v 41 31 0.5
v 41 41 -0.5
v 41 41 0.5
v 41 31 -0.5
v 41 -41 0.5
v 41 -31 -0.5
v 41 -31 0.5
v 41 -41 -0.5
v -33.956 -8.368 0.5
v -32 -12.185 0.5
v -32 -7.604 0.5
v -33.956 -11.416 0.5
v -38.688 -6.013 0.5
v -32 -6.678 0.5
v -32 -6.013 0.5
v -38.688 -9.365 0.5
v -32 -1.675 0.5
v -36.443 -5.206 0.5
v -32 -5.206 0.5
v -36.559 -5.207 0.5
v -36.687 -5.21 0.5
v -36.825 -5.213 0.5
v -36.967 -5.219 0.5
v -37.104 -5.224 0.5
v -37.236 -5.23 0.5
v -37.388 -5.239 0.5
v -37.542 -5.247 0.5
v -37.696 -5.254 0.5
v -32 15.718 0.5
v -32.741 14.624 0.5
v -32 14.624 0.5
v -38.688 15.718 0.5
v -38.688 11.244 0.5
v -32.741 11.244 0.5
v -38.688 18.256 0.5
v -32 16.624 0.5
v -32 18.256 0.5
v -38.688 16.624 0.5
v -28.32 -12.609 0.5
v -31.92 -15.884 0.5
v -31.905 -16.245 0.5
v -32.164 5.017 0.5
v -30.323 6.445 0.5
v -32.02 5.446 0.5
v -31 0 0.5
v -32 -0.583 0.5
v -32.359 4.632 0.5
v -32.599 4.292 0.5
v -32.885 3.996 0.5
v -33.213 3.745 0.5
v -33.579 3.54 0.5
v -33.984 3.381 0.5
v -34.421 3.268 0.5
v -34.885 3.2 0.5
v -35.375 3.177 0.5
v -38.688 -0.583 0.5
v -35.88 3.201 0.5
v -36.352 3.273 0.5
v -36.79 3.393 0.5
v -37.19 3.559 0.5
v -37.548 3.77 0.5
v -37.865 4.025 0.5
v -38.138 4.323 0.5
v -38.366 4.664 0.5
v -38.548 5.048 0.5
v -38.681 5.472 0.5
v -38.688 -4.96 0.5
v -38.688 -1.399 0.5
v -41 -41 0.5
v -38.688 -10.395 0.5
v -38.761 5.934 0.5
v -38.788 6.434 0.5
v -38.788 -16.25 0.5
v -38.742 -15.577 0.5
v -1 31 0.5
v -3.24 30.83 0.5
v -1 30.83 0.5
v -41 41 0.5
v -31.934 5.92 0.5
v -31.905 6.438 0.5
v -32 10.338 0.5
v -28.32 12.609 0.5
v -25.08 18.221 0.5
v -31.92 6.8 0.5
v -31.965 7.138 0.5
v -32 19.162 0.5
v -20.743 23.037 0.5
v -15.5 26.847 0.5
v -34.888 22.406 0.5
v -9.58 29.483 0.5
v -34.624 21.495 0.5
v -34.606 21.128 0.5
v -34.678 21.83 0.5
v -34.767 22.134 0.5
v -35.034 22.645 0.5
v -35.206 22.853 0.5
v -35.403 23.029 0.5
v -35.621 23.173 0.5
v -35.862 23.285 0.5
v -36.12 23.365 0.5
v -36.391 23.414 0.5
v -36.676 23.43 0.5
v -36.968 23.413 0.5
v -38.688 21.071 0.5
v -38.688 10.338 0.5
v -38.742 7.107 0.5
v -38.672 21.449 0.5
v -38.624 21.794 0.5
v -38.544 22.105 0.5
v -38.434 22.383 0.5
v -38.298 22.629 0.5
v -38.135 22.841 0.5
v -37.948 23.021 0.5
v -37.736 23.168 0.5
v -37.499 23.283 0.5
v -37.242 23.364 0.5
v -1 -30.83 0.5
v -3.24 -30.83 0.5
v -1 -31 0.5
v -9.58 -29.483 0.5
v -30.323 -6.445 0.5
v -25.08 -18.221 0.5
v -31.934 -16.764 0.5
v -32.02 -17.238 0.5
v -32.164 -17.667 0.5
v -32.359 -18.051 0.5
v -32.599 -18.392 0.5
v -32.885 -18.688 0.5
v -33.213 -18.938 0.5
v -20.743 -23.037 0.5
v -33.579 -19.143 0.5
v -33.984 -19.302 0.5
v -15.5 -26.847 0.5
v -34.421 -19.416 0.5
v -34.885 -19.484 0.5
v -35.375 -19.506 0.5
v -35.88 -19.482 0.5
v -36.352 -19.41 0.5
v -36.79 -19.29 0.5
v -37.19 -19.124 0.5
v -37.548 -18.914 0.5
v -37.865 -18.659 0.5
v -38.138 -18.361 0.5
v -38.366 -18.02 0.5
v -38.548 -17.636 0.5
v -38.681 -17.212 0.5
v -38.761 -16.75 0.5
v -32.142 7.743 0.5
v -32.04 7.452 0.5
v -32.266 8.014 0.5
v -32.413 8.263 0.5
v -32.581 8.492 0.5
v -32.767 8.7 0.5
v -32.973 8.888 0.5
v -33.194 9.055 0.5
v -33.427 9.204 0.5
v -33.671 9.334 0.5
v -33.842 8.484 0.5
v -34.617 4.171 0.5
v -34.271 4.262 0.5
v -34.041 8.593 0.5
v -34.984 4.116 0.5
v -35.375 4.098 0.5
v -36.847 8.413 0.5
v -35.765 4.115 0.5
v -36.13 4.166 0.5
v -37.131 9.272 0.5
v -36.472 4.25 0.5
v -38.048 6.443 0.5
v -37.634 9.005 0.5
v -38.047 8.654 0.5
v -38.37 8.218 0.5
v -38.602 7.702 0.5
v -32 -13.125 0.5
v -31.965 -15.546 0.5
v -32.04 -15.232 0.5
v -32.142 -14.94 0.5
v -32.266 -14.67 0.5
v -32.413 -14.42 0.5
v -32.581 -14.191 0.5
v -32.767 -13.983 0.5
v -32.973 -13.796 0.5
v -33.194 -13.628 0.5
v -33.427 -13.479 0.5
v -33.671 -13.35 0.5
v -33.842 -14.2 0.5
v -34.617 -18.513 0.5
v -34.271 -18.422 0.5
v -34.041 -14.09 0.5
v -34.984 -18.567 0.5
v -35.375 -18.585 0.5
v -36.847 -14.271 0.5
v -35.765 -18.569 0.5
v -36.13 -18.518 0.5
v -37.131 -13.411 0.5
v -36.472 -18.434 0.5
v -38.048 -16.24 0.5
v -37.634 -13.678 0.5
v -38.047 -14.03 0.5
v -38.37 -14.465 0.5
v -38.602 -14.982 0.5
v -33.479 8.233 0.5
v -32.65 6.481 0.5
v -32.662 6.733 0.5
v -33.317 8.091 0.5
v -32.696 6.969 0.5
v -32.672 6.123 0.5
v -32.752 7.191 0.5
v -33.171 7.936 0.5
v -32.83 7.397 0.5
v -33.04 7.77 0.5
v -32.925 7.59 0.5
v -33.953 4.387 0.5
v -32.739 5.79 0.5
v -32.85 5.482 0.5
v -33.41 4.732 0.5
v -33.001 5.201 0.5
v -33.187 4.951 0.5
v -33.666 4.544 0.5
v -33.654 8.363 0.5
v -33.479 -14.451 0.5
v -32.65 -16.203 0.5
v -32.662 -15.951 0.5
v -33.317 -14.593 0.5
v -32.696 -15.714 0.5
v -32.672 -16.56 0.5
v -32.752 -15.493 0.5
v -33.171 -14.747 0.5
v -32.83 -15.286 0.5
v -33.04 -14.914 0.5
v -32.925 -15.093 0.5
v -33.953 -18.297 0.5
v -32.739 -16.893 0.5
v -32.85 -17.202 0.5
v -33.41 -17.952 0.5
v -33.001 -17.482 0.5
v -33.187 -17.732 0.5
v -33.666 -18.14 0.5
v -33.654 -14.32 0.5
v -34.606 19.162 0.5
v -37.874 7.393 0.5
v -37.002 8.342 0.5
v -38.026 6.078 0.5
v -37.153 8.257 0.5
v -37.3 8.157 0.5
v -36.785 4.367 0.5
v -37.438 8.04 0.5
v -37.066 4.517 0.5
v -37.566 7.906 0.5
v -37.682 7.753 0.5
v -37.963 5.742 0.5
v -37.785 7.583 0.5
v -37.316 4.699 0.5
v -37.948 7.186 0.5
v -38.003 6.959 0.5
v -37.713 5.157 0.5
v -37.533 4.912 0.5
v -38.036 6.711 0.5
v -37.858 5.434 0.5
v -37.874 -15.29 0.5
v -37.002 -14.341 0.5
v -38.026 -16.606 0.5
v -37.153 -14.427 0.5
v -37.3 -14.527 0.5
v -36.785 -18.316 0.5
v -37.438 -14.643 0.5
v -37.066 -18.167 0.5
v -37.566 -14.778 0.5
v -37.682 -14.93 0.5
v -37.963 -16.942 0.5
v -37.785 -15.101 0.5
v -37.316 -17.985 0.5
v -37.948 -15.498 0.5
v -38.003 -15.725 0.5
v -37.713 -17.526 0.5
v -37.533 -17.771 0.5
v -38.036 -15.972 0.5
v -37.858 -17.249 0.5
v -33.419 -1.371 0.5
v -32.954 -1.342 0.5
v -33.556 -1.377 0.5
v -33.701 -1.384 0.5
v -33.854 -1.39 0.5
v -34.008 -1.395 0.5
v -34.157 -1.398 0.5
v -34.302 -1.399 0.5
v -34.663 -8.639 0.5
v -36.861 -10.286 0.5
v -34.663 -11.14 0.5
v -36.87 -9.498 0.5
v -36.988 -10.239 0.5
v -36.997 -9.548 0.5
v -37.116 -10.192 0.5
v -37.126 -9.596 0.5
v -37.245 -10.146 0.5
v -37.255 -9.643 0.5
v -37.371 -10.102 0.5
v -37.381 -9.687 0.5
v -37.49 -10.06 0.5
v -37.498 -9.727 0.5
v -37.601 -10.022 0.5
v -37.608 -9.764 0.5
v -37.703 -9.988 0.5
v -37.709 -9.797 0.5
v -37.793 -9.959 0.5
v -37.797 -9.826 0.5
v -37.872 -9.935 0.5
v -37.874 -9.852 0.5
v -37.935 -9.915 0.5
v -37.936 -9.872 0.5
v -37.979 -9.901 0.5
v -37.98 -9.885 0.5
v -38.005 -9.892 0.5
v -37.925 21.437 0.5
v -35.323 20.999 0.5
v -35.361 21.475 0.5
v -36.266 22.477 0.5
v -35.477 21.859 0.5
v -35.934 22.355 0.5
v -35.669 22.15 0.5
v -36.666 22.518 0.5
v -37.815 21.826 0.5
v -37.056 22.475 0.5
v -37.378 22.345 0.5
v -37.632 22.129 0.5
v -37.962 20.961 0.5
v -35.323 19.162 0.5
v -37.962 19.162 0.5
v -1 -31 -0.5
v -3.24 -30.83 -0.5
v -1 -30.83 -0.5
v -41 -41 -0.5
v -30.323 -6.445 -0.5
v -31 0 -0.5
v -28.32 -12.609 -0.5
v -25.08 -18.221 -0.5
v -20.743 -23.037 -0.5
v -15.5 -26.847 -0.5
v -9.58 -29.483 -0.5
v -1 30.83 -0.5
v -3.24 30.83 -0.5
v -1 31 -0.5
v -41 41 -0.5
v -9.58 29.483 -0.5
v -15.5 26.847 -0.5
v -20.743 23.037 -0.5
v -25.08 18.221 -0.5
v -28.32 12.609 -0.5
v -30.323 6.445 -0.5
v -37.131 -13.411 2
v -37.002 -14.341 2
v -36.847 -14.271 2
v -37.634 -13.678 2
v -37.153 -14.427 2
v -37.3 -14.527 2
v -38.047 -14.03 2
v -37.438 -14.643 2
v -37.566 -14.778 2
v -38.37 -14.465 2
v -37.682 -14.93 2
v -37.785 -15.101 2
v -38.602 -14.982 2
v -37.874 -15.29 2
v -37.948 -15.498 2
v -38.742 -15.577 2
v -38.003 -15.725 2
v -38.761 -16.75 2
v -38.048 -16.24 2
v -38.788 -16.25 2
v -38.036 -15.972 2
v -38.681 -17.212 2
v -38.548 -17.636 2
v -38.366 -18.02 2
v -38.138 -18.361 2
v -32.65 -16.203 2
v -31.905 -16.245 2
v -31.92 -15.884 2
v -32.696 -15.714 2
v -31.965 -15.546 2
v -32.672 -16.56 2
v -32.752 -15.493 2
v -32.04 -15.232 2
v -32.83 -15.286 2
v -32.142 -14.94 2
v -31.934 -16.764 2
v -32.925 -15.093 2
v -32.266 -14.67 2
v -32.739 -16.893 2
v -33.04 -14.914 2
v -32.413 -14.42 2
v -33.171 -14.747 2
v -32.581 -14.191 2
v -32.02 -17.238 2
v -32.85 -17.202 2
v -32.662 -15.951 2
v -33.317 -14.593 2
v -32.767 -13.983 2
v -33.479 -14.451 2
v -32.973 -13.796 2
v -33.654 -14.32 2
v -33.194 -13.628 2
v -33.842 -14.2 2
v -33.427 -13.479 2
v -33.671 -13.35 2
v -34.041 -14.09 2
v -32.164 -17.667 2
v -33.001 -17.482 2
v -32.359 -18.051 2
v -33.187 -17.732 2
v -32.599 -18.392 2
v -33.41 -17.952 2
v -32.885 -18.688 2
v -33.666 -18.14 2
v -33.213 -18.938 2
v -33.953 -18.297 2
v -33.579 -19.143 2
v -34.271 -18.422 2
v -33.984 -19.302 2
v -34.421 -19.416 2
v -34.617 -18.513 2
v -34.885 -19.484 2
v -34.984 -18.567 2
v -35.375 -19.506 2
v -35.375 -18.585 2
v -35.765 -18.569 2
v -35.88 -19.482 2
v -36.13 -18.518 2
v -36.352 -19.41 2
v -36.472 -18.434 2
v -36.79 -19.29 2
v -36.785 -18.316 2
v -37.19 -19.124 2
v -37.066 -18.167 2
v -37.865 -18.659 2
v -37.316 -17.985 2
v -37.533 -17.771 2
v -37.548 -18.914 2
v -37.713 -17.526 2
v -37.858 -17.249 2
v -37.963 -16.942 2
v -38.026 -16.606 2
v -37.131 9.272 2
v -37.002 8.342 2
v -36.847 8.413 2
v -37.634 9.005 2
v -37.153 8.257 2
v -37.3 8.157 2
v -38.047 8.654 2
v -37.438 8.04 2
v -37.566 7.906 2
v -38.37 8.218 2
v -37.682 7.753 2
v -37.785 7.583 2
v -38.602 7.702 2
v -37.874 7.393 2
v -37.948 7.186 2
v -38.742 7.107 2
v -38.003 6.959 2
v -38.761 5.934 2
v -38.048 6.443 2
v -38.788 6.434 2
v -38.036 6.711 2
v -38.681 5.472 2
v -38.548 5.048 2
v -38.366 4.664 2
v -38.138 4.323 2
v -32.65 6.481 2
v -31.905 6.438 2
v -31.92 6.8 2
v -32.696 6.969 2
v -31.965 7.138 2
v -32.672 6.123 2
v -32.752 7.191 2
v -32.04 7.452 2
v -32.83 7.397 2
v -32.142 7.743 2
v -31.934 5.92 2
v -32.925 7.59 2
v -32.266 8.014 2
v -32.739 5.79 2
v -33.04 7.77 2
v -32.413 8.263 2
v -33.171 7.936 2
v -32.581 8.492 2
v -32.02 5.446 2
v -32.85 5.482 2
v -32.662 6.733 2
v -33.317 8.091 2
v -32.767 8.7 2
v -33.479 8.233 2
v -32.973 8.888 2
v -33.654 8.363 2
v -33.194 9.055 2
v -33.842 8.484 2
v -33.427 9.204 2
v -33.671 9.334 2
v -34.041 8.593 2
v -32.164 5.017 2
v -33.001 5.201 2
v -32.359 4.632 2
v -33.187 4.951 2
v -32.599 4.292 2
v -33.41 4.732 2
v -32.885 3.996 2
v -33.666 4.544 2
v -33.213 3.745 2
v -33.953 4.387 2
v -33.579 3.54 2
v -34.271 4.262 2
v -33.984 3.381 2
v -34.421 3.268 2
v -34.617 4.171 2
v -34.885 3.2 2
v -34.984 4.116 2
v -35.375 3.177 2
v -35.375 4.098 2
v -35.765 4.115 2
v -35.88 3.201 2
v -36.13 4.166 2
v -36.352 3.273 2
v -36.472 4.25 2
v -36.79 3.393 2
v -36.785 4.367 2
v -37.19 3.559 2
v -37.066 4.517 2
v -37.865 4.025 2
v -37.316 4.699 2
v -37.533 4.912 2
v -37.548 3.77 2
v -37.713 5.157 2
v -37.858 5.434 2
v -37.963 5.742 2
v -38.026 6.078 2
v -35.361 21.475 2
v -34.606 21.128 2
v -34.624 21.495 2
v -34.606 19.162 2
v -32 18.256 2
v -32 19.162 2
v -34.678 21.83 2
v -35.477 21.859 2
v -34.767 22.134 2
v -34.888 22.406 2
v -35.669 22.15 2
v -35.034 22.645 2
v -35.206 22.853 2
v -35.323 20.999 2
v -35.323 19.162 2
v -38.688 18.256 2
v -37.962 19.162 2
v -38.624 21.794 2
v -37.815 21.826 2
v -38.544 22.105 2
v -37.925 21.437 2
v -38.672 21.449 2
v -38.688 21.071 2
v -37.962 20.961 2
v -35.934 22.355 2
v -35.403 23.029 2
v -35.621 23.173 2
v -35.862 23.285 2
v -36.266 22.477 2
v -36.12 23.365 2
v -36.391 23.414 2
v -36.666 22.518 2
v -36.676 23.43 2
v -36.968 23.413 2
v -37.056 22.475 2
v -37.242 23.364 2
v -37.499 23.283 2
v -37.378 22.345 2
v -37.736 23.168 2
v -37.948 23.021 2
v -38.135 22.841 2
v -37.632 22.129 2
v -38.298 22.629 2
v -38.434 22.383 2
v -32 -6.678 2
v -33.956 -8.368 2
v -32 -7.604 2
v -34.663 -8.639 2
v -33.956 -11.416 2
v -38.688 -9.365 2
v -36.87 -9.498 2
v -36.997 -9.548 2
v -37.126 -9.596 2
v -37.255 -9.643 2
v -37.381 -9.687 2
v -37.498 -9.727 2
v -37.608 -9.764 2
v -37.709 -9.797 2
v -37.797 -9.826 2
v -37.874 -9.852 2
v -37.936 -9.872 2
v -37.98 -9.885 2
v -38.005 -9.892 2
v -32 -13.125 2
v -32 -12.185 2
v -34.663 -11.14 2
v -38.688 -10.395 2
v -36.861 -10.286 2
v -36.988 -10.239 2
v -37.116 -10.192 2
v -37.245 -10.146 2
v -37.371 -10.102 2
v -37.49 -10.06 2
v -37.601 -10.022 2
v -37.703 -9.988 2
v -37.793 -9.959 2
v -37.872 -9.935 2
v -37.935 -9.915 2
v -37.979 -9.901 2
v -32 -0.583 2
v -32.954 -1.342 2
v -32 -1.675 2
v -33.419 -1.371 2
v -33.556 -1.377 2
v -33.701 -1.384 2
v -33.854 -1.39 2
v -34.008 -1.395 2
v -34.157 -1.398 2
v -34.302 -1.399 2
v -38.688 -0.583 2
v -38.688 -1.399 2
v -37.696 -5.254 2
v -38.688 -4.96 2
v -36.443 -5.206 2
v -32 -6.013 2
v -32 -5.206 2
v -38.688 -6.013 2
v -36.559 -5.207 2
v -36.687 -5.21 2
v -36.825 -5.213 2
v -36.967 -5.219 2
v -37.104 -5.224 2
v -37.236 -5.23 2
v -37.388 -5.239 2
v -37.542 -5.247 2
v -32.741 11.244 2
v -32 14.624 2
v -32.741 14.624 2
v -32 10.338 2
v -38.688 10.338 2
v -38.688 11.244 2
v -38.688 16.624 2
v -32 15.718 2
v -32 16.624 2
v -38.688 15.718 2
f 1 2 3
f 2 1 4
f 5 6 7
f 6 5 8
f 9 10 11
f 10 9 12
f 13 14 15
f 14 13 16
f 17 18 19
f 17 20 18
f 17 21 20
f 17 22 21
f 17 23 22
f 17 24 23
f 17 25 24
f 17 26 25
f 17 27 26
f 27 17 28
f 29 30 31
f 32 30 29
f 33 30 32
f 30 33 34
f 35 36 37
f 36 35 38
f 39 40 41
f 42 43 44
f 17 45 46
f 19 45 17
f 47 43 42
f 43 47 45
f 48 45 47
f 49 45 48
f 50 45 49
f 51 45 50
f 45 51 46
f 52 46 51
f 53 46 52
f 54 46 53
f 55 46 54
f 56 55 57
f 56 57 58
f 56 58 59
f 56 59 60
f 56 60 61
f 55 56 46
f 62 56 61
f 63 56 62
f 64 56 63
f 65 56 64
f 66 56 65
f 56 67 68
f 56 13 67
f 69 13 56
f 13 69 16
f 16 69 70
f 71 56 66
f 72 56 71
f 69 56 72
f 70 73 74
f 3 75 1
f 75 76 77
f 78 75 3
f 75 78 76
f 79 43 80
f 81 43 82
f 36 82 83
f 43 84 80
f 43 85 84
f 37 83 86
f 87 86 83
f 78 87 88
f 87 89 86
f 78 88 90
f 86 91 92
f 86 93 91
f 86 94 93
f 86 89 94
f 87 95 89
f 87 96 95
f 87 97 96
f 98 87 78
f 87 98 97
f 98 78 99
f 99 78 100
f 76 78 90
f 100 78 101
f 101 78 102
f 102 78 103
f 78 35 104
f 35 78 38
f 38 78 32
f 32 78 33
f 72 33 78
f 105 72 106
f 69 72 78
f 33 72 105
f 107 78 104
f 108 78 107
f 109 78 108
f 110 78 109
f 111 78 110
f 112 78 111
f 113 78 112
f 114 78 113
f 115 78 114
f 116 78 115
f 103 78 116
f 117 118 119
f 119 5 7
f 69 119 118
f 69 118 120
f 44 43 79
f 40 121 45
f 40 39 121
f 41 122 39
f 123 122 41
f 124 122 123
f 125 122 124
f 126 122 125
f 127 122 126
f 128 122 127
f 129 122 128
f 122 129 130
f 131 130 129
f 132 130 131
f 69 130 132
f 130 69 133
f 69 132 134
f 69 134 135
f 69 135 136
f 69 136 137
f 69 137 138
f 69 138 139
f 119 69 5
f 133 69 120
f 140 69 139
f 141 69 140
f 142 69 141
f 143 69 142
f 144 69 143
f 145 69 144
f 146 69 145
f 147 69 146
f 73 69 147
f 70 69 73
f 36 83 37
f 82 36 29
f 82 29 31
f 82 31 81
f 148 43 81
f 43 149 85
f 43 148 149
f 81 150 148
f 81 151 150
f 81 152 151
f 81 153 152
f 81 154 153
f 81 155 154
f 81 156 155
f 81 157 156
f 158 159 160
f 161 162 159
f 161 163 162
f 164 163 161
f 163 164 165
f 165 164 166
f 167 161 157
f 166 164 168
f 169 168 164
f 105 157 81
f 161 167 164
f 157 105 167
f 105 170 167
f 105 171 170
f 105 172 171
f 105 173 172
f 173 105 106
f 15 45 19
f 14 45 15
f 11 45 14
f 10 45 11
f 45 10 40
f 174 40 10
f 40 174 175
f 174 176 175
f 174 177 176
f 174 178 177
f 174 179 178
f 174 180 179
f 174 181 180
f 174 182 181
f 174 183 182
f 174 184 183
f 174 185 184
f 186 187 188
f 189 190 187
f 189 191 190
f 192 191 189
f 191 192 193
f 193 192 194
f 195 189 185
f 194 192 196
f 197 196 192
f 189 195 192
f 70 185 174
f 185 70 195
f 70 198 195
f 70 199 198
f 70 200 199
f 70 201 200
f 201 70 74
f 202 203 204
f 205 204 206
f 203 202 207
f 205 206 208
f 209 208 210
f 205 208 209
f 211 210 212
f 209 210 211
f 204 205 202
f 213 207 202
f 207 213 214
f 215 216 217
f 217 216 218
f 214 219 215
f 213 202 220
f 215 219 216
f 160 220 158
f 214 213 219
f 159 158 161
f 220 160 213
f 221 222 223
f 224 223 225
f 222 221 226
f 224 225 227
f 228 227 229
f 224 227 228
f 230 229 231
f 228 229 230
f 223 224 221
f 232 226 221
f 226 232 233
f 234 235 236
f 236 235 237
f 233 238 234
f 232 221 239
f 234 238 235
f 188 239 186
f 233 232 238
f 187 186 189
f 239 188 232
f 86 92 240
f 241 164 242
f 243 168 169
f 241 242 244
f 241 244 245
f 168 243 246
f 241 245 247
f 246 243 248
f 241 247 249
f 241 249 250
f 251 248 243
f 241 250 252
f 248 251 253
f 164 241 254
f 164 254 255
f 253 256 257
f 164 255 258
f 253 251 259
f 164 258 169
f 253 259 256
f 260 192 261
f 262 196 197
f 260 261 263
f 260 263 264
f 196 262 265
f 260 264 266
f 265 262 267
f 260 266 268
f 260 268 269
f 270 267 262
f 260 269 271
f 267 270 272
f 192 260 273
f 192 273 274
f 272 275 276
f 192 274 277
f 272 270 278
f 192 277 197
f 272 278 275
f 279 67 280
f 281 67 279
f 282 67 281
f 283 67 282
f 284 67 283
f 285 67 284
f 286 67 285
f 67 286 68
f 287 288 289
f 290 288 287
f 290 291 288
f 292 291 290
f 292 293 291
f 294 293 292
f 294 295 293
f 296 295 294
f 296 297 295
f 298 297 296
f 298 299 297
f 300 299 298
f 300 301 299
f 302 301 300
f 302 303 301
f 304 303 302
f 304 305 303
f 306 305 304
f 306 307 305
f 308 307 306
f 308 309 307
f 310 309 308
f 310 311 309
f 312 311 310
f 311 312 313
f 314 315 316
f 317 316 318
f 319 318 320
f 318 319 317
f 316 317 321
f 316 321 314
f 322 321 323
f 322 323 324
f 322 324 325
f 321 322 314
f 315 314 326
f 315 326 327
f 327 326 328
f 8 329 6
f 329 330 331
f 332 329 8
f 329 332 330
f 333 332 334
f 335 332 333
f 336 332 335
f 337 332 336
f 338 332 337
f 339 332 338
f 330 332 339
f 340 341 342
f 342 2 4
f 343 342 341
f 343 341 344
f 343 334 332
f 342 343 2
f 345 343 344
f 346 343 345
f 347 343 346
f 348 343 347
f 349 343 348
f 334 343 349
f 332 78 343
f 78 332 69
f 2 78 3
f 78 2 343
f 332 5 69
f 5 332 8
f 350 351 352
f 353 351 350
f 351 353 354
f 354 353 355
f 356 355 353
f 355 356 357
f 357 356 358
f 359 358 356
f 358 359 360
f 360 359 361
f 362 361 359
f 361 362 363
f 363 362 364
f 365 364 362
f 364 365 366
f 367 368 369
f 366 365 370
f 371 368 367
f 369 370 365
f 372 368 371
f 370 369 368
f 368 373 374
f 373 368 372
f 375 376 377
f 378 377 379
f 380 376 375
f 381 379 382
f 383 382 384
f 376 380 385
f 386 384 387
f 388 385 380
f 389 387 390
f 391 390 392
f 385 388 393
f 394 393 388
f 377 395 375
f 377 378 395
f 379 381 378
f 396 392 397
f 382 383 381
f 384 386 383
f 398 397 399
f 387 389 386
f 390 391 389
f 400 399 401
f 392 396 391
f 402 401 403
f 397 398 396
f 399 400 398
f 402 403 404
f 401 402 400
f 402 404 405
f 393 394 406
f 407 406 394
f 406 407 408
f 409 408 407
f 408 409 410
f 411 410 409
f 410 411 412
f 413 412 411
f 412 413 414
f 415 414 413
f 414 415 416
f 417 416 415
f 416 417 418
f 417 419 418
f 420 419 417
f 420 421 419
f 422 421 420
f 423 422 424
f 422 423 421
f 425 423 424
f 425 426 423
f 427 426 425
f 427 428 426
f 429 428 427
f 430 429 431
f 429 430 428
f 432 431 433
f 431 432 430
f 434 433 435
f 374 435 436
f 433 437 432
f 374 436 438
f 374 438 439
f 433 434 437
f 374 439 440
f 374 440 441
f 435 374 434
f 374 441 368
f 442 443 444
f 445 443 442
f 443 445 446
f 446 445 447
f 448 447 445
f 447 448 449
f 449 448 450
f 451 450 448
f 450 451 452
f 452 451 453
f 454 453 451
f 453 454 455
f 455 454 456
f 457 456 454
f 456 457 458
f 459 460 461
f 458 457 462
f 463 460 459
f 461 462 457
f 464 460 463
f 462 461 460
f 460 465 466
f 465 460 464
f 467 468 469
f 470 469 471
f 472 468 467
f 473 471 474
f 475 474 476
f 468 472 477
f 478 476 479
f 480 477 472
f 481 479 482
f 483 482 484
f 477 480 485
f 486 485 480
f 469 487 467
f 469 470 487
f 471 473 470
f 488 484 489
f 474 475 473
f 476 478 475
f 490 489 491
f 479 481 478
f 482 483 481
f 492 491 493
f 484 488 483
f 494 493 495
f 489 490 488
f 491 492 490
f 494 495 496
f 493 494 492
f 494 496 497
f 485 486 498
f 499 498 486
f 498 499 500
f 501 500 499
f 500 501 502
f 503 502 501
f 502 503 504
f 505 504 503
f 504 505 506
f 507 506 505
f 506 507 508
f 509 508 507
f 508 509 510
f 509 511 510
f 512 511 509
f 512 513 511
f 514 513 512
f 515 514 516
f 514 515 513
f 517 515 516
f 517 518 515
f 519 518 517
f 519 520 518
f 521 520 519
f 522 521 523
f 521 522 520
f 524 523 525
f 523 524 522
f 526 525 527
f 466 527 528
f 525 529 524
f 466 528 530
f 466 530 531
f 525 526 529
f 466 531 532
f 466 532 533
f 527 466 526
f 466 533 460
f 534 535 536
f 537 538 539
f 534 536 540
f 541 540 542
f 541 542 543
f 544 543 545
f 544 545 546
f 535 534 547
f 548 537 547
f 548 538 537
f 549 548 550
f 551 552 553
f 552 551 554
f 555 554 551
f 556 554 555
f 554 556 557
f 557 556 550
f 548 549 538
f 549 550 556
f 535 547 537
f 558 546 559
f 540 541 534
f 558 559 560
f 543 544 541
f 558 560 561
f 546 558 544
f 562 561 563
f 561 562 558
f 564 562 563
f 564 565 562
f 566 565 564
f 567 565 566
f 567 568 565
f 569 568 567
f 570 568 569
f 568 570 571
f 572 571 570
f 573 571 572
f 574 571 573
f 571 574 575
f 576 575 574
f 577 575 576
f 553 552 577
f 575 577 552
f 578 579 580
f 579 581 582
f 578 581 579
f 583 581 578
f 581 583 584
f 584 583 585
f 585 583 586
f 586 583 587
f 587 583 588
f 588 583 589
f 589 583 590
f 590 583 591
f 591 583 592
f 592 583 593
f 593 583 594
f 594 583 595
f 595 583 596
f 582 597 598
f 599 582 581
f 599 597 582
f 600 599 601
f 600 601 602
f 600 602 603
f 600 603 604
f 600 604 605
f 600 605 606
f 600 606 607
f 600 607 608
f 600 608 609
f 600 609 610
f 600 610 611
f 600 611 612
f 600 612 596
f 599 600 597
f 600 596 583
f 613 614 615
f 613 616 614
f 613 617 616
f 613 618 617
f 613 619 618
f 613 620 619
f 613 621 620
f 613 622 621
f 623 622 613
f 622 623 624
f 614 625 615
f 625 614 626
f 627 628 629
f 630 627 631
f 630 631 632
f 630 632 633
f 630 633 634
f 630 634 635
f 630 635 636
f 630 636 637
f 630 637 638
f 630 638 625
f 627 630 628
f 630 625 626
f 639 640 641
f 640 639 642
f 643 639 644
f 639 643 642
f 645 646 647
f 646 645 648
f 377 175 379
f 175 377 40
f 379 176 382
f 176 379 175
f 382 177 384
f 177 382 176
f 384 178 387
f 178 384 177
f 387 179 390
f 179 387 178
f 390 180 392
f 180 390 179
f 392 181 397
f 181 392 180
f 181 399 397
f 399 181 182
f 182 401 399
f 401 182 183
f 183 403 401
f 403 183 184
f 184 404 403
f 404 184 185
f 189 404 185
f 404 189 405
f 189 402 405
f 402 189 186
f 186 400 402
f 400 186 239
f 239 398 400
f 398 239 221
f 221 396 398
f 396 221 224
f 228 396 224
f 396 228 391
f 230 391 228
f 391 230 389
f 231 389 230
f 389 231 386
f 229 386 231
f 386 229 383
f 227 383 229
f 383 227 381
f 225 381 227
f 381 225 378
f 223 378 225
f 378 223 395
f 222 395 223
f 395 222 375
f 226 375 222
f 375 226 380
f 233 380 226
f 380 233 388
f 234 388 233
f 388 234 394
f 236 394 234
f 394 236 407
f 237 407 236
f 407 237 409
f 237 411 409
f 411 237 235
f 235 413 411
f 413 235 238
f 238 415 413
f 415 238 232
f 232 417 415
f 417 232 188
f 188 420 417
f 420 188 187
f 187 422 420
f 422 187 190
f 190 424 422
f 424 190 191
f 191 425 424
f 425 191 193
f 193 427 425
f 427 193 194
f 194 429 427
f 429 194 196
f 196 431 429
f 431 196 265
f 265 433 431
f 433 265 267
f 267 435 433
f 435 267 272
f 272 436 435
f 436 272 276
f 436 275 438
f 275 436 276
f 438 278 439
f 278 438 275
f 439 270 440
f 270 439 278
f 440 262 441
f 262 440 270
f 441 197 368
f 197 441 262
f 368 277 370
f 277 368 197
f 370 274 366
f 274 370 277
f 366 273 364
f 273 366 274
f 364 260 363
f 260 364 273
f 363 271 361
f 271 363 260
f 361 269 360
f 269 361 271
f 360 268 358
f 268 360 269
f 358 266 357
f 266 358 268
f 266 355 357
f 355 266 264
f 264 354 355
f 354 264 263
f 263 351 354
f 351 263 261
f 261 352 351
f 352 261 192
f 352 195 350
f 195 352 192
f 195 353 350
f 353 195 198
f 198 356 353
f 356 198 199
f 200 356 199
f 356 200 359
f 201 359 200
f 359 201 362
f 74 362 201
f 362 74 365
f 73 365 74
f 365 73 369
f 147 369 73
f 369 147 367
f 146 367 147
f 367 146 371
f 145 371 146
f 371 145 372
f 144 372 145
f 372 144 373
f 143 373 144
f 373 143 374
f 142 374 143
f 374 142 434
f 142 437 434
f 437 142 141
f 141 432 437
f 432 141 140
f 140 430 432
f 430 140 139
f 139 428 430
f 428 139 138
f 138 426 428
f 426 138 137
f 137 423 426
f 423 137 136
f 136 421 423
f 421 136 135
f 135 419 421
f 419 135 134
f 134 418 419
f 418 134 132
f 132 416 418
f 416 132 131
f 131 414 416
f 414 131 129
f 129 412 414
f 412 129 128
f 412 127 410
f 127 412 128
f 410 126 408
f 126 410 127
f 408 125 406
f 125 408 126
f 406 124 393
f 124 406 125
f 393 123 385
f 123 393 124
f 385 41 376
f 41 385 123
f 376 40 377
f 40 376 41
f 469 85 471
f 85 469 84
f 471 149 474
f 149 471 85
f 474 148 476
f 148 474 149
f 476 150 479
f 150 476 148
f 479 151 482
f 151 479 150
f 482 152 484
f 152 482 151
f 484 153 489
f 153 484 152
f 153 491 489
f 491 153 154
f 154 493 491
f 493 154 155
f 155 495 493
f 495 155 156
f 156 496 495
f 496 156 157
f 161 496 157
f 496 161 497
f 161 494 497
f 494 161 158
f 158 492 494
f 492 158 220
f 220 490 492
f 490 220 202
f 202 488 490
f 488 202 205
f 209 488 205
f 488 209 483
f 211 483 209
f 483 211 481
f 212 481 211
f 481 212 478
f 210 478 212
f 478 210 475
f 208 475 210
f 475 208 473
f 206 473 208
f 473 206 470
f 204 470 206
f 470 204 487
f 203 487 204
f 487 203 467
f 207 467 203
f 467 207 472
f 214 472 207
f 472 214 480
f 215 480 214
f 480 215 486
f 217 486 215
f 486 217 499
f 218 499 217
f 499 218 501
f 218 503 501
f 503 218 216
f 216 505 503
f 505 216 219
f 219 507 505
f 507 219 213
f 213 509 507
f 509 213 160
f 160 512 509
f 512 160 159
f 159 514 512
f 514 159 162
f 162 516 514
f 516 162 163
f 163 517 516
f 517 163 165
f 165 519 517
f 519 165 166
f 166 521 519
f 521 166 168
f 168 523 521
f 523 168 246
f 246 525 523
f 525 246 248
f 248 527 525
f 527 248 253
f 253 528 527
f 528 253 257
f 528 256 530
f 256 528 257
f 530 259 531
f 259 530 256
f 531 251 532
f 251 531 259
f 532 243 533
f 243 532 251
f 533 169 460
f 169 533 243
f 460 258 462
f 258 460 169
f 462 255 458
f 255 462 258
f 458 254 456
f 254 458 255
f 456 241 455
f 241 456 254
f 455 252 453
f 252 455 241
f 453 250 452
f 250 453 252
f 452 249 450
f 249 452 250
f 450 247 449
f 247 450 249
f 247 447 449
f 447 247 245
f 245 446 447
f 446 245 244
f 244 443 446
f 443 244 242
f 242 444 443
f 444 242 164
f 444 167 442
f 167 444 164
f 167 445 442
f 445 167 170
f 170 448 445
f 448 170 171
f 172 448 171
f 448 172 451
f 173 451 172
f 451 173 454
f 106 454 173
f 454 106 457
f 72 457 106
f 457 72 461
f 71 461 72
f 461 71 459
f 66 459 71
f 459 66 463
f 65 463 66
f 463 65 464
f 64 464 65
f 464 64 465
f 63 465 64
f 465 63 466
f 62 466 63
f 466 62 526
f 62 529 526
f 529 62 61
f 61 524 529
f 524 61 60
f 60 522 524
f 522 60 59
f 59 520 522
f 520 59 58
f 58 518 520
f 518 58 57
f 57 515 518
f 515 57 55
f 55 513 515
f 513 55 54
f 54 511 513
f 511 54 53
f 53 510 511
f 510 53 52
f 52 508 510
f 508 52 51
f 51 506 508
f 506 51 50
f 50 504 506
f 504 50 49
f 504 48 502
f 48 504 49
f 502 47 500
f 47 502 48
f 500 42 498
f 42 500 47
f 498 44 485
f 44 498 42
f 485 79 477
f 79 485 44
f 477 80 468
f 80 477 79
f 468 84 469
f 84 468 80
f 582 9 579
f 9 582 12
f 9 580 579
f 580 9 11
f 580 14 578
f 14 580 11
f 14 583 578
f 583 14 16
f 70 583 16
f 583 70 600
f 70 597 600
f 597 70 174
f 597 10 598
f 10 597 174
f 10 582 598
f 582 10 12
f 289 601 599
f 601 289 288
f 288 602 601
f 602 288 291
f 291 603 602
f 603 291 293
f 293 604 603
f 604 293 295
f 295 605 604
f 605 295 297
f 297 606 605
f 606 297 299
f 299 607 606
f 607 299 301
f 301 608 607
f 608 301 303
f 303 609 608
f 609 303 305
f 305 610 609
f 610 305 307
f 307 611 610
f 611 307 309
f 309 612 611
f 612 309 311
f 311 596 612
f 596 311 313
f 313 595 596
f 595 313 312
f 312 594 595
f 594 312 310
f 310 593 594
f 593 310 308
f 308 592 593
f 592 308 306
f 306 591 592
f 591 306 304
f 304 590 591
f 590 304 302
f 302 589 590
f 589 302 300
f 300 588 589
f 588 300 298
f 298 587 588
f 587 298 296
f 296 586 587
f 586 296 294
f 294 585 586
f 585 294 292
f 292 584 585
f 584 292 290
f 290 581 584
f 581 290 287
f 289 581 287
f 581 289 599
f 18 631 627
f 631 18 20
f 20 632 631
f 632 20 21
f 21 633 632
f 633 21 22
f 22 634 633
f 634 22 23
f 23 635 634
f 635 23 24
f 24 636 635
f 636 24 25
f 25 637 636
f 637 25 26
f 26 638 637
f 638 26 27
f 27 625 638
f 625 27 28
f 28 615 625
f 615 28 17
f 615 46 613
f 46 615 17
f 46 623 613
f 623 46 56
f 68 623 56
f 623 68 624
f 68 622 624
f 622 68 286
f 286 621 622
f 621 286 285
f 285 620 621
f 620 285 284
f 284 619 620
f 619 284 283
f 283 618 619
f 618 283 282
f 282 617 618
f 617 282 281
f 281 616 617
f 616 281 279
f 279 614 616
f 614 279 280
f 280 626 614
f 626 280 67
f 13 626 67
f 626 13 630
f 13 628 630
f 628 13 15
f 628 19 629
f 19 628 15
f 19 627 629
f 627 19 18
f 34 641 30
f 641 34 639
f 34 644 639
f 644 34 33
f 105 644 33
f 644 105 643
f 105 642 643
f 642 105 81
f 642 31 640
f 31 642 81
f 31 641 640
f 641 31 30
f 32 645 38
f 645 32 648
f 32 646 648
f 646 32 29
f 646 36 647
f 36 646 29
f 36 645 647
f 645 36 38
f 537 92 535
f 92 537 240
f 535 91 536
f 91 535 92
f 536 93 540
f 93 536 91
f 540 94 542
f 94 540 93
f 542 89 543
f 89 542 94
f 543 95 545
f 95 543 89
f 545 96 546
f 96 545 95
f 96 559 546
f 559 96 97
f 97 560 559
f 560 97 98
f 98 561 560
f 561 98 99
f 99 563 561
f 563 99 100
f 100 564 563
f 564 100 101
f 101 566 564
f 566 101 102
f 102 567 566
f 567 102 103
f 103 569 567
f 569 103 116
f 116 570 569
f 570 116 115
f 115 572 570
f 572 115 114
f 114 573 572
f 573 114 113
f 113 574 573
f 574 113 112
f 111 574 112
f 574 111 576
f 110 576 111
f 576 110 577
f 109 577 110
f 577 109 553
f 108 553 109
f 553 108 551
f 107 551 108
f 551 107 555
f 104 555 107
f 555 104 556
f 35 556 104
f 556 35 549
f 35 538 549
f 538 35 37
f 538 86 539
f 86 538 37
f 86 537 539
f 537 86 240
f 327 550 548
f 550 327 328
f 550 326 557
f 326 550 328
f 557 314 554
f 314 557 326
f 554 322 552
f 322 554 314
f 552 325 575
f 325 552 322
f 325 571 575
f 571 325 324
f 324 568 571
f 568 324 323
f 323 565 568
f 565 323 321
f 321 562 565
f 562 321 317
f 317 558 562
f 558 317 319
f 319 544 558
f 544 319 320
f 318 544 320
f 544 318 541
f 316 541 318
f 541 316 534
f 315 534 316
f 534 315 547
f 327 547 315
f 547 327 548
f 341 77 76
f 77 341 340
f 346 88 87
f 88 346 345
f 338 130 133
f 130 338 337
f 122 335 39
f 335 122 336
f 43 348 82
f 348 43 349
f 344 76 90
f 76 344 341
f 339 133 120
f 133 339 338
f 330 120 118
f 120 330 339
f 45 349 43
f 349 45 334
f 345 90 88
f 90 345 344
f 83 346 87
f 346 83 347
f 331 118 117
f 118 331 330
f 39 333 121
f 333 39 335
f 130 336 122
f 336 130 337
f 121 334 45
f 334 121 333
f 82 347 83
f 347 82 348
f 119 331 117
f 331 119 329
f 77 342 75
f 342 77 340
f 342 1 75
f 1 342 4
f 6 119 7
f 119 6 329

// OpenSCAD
//Line Marking paint can retaining clip

length=82;
width=82;
diameter=62;
thickness=1;

module clip(length,width,diameter,thickness) {
    difference() {
        union(){
   cube([length,width,thickness],center=true); 
            linear_extrude(thickness*2) translate([-32,-20,0]) rotate([0,0,90])  text("CAN CLIP",7);
        }
   union() {
       cylinder(h=thickness+0.1,d=diameter,center=true);
       translate([30,0,0]) cube([diameter,diameter,thickness+0.1],center=true);
   }
}
}

clip(length,width,diameter,thickness);
